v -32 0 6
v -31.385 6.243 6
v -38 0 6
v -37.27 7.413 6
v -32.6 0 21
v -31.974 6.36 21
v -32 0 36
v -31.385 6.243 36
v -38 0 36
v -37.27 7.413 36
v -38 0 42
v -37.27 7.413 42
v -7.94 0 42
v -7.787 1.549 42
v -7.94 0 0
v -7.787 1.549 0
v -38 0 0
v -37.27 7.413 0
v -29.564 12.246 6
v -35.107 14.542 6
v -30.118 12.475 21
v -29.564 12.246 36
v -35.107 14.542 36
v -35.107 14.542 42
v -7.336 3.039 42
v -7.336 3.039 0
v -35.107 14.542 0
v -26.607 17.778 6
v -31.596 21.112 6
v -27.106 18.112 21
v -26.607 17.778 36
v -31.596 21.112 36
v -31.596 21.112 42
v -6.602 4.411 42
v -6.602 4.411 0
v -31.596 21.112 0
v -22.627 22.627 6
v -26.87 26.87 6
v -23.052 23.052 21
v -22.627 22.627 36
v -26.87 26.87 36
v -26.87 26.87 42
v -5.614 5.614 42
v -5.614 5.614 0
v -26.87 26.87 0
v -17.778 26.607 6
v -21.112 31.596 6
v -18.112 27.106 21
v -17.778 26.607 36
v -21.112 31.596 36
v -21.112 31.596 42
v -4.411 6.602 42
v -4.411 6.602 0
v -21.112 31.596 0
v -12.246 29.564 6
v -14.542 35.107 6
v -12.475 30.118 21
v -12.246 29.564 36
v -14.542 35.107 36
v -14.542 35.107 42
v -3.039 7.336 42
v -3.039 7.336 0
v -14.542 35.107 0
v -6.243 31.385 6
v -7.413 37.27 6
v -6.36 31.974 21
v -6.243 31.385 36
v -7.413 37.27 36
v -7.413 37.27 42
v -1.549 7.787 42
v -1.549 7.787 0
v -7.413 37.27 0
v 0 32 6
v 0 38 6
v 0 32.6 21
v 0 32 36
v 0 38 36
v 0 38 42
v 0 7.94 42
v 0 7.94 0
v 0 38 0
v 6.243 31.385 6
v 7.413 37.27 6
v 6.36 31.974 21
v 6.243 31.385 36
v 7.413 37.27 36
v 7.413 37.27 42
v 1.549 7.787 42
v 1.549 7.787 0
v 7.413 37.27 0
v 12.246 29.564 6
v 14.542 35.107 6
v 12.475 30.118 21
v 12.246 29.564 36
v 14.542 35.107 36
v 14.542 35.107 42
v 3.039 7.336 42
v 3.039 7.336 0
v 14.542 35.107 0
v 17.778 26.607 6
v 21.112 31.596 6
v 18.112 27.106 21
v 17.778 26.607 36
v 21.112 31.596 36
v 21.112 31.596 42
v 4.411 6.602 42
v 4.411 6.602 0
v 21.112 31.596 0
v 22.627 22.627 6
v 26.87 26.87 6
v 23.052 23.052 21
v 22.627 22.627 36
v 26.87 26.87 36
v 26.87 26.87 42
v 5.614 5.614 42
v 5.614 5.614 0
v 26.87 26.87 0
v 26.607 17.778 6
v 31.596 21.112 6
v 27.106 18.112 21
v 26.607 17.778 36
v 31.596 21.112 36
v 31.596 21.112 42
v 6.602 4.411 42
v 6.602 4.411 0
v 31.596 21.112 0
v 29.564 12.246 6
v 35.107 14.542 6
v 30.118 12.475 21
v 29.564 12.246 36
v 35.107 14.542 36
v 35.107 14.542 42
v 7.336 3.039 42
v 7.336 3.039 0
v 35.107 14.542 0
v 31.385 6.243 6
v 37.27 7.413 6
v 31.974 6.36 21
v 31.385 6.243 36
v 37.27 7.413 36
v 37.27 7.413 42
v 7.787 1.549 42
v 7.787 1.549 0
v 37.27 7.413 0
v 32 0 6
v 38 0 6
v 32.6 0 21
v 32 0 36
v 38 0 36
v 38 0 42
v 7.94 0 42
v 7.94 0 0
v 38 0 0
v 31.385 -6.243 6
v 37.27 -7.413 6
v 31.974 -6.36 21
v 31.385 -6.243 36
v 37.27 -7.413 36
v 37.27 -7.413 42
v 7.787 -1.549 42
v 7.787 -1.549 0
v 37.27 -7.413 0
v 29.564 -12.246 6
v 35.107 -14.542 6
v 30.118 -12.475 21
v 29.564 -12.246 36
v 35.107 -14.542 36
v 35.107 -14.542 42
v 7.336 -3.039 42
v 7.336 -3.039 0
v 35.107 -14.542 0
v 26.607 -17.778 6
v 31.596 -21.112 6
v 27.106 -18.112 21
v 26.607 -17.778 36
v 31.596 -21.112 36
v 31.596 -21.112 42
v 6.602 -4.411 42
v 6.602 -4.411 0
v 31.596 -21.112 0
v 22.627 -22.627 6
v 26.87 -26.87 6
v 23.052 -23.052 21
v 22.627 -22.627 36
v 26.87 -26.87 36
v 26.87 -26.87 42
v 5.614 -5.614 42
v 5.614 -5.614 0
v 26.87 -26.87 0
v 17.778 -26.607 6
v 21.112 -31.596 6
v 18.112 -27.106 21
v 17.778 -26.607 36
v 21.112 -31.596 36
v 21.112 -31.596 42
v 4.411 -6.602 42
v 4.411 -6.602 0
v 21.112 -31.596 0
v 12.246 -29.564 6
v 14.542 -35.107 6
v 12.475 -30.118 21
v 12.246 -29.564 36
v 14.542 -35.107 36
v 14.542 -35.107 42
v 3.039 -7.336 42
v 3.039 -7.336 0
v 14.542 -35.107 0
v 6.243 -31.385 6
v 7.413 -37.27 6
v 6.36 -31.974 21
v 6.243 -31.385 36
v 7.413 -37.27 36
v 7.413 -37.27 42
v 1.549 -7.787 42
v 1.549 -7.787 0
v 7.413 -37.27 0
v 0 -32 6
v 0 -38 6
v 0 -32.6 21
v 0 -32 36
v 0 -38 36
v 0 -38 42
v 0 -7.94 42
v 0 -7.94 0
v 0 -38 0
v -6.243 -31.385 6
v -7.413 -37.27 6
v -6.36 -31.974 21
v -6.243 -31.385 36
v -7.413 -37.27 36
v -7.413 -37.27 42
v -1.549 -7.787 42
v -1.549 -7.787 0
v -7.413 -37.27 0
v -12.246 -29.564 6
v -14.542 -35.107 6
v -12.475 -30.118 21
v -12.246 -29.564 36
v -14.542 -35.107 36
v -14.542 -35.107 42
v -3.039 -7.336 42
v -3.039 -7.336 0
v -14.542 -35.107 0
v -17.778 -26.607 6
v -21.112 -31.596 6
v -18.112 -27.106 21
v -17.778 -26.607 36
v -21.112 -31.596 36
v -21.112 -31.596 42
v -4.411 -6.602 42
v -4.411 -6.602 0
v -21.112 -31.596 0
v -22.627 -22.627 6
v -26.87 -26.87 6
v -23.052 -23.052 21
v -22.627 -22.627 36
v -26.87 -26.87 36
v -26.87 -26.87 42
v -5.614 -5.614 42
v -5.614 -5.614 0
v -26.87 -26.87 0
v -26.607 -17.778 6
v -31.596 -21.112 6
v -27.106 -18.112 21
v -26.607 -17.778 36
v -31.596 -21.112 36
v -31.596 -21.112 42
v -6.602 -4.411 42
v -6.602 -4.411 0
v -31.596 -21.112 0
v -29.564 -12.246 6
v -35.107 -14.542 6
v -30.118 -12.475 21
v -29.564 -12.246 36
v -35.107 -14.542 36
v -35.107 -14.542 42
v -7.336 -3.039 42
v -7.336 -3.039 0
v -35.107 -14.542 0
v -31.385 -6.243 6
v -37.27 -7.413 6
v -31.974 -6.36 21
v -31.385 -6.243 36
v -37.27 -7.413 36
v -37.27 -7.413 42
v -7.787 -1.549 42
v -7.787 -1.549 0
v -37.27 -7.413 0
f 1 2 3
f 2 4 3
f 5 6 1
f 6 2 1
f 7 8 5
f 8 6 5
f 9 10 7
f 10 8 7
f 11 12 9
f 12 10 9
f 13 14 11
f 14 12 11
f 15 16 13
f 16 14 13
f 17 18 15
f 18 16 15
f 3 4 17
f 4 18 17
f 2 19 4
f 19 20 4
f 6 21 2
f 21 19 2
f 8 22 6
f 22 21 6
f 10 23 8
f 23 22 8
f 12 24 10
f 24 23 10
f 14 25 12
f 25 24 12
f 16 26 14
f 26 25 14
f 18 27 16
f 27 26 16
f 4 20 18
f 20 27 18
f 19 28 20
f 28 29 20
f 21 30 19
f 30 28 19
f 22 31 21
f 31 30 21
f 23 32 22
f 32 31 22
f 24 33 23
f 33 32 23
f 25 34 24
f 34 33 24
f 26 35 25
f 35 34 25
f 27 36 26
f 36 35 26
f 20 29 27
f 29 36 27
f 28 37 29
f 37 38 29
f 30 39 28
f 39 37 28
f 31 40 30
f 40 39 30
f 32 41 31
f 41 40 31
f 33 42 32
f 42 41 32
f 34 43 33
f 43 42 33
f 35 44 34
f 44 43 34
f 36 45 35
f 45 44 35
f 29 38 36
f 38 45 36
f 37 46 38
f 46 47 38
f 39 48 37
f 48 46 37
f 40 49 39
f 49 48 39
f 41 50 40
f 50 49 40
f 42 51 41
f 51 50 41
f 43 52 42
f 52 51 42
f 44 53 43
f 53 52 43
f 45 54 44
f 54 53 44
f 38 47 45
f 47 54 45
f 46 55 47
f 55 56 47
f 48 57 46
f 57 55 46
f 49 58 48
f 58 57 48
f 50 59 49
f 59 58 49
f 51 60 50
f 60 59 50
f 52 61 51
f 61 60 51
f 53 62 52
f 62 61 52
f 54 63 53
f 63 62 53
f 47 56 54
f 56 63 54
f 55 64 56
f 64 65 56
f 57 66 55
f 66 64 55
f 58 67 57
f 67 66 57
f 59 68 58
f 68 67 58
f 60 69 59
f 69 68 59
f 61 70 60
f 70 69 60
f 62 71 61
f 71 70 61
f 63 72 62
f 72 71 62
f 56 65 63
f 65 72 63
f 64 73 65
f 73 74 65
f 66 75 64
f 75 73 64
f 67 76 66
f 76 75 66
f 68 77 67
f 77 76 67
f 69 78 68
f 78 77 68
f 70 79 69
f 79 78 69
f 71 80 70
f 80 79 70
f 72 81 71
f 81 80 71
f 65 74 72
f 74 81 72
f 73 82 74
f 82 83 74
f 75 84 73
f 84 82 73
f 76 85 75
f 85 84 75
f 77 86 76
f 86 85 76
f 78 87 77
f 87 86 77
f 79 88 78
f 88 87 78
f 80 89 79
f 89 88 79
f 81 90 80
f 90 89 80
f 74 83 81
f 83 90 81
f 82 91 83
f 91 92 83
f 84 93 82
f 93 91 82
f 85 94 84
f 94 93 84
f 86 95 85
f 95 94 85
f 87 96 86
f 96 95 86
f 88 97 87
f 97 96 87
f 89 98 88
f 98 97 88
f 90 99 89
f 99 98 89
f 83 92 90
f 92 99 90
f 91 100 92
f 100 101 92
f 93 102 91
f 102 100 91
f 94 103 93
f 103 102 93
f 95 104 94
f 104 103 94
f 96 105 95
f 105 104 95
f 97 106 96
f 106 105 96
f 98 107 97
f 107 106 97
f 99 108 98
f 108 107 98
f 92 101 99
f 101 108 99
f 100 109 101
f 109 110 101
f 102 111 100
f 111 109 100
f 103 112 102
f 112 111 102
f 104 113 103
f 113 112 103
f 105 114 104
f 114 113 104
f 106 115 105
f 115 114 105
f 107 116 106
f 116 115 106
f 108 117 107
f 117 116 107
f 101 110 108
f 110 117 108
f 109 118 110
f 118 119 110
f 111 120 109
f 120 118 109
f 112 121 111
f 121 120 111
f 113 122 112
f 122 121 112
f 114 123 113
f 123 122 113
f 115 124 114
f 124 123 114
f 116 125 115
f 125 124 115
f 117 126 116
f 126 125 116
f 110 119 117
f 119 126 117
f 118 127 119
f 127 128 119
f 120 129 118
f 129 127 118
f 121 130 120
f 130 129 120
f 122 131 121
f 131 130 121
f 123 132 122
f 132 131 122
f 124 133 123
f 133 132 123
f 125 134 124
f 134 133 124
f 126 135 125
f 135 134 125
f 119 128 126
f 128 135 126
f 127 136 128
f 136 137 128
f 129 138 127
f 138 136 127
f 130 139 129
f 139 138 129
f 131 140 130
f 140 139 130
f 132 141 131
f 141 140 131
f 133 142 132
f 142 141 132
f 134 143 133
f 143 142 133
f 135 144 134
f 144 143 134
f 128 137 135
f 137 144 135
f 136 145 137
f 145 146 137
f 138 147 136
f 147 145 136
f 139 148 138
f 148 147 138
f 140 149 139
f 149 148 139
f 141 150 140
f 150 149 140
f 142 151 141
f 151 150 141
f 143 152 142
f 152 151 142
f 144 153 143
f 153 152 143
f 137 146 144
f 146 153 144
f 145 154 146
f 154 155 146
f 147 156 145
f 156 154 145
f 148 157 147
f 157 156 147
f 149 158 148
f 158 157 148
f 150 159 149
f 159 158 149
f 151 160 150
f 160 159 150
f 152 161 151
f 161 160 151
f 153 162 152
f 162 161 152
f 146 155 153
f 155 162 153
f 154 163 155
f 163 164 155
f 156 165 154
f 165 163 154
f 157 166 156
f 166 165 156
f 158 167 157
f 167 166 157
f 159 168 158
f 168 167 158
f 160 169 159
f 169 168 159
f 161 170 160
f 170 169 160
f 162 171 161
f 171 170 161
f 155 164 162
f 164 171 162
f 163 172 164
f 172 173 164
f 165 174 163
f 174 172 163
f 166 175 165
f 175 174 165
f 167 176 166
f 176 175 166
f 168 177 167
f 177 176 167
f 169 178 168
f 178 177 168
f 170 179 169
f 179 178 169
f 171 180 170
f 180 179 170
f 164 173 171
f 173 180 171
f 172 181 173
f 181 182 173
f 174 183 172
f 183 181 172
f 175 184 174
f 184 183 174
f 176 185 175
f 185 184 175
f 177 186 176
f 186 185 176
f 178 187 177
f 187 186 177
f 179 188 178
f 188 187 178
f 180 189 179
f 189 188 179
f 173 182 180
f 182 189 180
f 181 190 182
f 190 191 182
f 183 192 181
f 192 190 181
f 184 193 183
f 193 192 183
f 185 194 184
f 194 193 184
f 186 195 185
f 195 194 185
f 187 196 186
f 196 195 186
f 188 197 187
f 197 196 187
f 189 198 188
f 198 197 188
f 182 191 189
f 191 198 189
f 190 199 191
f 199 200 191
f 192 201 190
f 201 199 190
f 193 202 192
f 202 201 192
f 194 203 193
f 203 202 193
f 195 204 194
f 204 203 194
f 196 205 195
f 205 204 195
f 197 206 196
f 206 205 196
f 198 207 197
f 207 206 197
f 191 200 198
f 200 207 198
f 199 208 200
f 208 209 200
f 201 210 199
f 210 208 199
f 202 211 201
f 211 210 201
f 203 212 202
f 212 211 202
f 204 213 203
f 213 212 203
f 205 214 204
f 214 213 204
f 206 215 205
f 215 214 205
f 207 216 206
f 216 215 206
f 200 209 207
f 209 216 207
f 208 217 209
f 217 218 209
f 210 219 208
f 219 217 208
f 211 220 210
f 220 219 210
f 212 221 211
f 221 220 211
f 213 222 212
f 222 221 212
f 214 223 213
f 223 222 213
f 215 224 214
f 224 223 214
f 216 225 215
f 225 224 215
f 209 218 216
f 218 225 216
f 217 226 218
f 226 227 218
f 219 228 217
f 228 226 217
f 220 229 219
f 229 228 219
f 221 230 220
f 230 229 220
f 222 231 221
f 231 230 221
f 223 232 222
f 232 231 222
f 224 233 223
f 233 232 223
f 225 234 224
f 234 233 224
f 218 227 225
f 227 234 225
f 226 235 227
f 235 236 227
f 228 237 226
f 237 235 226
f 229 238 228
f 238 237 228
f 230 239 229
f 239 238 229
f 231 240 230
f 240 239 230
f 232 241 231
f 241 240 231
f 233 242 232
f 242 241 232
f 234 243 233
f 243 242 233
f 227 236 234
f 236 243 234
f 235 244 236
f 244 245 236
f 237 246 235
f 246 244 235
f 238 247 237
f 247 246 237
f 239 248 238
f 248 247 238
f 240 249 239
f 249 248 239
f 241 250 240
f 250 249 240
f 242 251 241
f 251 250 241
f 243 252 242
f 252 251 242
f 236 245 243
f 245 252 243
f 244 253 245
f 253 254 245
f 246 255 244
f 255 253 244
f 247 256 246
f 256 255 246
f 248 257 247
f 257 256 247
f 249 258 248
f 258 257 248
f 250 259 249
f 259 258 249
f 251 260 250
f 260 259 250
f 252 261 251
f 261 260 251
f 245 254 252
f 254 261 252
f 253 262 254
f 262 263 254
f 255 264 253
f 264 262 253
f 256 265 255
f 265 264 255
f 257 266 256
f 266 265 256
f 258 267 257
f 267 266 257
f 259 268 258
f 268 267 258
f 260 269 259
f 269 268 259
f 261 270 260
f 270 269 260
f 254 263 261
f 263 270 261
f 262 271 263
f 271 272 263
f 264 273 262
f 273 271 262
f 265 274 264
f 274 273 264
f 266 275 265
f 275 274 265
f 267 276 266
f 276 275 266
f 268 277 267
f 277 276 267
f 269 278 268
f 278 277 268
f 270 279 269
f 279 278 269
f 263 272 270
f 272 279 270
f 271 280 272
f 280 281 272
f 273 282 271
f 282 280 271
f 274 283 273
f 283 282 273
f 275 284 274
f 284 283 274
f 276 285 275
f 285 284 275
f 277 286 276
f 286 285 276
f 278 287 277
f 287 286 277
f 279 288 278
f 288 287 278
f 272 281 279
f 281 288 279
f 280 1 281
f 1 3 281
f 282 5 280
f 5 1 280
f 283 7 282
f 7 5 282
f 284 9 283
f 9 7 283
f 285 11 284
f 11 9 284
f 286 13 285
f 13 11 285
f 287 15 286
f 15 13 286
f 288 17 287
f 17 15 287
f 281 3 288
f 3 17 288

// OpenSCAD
$fn = 32;

// ----------------------------------------------------------------------
// Belt roller: 64 mm barrel, 42 mm wide, bore 15.88 mm
// ----------------------------------------------------------------------

// --- parameters (mm) ---
bore_d = 15.88;           // bore
barrel_d = 64;            // barrel diameter
roller_w = 42;            // roller width
flange_d = 76;            // flange diameter
flange_t = 6;             // flange thickness
hub_d = 39.88;            // hub diameter

roller_profile = [[7.94, 0], [38, 0], [38, 6], [32, 6], [32.6, 21], [32, 36], [38, 36], [38, 42], [7.94, 42]];

/* the profile stays clear of the axis, so the bore comes out of the revolve */
rotate_extrude() polygon(roller_profile);
